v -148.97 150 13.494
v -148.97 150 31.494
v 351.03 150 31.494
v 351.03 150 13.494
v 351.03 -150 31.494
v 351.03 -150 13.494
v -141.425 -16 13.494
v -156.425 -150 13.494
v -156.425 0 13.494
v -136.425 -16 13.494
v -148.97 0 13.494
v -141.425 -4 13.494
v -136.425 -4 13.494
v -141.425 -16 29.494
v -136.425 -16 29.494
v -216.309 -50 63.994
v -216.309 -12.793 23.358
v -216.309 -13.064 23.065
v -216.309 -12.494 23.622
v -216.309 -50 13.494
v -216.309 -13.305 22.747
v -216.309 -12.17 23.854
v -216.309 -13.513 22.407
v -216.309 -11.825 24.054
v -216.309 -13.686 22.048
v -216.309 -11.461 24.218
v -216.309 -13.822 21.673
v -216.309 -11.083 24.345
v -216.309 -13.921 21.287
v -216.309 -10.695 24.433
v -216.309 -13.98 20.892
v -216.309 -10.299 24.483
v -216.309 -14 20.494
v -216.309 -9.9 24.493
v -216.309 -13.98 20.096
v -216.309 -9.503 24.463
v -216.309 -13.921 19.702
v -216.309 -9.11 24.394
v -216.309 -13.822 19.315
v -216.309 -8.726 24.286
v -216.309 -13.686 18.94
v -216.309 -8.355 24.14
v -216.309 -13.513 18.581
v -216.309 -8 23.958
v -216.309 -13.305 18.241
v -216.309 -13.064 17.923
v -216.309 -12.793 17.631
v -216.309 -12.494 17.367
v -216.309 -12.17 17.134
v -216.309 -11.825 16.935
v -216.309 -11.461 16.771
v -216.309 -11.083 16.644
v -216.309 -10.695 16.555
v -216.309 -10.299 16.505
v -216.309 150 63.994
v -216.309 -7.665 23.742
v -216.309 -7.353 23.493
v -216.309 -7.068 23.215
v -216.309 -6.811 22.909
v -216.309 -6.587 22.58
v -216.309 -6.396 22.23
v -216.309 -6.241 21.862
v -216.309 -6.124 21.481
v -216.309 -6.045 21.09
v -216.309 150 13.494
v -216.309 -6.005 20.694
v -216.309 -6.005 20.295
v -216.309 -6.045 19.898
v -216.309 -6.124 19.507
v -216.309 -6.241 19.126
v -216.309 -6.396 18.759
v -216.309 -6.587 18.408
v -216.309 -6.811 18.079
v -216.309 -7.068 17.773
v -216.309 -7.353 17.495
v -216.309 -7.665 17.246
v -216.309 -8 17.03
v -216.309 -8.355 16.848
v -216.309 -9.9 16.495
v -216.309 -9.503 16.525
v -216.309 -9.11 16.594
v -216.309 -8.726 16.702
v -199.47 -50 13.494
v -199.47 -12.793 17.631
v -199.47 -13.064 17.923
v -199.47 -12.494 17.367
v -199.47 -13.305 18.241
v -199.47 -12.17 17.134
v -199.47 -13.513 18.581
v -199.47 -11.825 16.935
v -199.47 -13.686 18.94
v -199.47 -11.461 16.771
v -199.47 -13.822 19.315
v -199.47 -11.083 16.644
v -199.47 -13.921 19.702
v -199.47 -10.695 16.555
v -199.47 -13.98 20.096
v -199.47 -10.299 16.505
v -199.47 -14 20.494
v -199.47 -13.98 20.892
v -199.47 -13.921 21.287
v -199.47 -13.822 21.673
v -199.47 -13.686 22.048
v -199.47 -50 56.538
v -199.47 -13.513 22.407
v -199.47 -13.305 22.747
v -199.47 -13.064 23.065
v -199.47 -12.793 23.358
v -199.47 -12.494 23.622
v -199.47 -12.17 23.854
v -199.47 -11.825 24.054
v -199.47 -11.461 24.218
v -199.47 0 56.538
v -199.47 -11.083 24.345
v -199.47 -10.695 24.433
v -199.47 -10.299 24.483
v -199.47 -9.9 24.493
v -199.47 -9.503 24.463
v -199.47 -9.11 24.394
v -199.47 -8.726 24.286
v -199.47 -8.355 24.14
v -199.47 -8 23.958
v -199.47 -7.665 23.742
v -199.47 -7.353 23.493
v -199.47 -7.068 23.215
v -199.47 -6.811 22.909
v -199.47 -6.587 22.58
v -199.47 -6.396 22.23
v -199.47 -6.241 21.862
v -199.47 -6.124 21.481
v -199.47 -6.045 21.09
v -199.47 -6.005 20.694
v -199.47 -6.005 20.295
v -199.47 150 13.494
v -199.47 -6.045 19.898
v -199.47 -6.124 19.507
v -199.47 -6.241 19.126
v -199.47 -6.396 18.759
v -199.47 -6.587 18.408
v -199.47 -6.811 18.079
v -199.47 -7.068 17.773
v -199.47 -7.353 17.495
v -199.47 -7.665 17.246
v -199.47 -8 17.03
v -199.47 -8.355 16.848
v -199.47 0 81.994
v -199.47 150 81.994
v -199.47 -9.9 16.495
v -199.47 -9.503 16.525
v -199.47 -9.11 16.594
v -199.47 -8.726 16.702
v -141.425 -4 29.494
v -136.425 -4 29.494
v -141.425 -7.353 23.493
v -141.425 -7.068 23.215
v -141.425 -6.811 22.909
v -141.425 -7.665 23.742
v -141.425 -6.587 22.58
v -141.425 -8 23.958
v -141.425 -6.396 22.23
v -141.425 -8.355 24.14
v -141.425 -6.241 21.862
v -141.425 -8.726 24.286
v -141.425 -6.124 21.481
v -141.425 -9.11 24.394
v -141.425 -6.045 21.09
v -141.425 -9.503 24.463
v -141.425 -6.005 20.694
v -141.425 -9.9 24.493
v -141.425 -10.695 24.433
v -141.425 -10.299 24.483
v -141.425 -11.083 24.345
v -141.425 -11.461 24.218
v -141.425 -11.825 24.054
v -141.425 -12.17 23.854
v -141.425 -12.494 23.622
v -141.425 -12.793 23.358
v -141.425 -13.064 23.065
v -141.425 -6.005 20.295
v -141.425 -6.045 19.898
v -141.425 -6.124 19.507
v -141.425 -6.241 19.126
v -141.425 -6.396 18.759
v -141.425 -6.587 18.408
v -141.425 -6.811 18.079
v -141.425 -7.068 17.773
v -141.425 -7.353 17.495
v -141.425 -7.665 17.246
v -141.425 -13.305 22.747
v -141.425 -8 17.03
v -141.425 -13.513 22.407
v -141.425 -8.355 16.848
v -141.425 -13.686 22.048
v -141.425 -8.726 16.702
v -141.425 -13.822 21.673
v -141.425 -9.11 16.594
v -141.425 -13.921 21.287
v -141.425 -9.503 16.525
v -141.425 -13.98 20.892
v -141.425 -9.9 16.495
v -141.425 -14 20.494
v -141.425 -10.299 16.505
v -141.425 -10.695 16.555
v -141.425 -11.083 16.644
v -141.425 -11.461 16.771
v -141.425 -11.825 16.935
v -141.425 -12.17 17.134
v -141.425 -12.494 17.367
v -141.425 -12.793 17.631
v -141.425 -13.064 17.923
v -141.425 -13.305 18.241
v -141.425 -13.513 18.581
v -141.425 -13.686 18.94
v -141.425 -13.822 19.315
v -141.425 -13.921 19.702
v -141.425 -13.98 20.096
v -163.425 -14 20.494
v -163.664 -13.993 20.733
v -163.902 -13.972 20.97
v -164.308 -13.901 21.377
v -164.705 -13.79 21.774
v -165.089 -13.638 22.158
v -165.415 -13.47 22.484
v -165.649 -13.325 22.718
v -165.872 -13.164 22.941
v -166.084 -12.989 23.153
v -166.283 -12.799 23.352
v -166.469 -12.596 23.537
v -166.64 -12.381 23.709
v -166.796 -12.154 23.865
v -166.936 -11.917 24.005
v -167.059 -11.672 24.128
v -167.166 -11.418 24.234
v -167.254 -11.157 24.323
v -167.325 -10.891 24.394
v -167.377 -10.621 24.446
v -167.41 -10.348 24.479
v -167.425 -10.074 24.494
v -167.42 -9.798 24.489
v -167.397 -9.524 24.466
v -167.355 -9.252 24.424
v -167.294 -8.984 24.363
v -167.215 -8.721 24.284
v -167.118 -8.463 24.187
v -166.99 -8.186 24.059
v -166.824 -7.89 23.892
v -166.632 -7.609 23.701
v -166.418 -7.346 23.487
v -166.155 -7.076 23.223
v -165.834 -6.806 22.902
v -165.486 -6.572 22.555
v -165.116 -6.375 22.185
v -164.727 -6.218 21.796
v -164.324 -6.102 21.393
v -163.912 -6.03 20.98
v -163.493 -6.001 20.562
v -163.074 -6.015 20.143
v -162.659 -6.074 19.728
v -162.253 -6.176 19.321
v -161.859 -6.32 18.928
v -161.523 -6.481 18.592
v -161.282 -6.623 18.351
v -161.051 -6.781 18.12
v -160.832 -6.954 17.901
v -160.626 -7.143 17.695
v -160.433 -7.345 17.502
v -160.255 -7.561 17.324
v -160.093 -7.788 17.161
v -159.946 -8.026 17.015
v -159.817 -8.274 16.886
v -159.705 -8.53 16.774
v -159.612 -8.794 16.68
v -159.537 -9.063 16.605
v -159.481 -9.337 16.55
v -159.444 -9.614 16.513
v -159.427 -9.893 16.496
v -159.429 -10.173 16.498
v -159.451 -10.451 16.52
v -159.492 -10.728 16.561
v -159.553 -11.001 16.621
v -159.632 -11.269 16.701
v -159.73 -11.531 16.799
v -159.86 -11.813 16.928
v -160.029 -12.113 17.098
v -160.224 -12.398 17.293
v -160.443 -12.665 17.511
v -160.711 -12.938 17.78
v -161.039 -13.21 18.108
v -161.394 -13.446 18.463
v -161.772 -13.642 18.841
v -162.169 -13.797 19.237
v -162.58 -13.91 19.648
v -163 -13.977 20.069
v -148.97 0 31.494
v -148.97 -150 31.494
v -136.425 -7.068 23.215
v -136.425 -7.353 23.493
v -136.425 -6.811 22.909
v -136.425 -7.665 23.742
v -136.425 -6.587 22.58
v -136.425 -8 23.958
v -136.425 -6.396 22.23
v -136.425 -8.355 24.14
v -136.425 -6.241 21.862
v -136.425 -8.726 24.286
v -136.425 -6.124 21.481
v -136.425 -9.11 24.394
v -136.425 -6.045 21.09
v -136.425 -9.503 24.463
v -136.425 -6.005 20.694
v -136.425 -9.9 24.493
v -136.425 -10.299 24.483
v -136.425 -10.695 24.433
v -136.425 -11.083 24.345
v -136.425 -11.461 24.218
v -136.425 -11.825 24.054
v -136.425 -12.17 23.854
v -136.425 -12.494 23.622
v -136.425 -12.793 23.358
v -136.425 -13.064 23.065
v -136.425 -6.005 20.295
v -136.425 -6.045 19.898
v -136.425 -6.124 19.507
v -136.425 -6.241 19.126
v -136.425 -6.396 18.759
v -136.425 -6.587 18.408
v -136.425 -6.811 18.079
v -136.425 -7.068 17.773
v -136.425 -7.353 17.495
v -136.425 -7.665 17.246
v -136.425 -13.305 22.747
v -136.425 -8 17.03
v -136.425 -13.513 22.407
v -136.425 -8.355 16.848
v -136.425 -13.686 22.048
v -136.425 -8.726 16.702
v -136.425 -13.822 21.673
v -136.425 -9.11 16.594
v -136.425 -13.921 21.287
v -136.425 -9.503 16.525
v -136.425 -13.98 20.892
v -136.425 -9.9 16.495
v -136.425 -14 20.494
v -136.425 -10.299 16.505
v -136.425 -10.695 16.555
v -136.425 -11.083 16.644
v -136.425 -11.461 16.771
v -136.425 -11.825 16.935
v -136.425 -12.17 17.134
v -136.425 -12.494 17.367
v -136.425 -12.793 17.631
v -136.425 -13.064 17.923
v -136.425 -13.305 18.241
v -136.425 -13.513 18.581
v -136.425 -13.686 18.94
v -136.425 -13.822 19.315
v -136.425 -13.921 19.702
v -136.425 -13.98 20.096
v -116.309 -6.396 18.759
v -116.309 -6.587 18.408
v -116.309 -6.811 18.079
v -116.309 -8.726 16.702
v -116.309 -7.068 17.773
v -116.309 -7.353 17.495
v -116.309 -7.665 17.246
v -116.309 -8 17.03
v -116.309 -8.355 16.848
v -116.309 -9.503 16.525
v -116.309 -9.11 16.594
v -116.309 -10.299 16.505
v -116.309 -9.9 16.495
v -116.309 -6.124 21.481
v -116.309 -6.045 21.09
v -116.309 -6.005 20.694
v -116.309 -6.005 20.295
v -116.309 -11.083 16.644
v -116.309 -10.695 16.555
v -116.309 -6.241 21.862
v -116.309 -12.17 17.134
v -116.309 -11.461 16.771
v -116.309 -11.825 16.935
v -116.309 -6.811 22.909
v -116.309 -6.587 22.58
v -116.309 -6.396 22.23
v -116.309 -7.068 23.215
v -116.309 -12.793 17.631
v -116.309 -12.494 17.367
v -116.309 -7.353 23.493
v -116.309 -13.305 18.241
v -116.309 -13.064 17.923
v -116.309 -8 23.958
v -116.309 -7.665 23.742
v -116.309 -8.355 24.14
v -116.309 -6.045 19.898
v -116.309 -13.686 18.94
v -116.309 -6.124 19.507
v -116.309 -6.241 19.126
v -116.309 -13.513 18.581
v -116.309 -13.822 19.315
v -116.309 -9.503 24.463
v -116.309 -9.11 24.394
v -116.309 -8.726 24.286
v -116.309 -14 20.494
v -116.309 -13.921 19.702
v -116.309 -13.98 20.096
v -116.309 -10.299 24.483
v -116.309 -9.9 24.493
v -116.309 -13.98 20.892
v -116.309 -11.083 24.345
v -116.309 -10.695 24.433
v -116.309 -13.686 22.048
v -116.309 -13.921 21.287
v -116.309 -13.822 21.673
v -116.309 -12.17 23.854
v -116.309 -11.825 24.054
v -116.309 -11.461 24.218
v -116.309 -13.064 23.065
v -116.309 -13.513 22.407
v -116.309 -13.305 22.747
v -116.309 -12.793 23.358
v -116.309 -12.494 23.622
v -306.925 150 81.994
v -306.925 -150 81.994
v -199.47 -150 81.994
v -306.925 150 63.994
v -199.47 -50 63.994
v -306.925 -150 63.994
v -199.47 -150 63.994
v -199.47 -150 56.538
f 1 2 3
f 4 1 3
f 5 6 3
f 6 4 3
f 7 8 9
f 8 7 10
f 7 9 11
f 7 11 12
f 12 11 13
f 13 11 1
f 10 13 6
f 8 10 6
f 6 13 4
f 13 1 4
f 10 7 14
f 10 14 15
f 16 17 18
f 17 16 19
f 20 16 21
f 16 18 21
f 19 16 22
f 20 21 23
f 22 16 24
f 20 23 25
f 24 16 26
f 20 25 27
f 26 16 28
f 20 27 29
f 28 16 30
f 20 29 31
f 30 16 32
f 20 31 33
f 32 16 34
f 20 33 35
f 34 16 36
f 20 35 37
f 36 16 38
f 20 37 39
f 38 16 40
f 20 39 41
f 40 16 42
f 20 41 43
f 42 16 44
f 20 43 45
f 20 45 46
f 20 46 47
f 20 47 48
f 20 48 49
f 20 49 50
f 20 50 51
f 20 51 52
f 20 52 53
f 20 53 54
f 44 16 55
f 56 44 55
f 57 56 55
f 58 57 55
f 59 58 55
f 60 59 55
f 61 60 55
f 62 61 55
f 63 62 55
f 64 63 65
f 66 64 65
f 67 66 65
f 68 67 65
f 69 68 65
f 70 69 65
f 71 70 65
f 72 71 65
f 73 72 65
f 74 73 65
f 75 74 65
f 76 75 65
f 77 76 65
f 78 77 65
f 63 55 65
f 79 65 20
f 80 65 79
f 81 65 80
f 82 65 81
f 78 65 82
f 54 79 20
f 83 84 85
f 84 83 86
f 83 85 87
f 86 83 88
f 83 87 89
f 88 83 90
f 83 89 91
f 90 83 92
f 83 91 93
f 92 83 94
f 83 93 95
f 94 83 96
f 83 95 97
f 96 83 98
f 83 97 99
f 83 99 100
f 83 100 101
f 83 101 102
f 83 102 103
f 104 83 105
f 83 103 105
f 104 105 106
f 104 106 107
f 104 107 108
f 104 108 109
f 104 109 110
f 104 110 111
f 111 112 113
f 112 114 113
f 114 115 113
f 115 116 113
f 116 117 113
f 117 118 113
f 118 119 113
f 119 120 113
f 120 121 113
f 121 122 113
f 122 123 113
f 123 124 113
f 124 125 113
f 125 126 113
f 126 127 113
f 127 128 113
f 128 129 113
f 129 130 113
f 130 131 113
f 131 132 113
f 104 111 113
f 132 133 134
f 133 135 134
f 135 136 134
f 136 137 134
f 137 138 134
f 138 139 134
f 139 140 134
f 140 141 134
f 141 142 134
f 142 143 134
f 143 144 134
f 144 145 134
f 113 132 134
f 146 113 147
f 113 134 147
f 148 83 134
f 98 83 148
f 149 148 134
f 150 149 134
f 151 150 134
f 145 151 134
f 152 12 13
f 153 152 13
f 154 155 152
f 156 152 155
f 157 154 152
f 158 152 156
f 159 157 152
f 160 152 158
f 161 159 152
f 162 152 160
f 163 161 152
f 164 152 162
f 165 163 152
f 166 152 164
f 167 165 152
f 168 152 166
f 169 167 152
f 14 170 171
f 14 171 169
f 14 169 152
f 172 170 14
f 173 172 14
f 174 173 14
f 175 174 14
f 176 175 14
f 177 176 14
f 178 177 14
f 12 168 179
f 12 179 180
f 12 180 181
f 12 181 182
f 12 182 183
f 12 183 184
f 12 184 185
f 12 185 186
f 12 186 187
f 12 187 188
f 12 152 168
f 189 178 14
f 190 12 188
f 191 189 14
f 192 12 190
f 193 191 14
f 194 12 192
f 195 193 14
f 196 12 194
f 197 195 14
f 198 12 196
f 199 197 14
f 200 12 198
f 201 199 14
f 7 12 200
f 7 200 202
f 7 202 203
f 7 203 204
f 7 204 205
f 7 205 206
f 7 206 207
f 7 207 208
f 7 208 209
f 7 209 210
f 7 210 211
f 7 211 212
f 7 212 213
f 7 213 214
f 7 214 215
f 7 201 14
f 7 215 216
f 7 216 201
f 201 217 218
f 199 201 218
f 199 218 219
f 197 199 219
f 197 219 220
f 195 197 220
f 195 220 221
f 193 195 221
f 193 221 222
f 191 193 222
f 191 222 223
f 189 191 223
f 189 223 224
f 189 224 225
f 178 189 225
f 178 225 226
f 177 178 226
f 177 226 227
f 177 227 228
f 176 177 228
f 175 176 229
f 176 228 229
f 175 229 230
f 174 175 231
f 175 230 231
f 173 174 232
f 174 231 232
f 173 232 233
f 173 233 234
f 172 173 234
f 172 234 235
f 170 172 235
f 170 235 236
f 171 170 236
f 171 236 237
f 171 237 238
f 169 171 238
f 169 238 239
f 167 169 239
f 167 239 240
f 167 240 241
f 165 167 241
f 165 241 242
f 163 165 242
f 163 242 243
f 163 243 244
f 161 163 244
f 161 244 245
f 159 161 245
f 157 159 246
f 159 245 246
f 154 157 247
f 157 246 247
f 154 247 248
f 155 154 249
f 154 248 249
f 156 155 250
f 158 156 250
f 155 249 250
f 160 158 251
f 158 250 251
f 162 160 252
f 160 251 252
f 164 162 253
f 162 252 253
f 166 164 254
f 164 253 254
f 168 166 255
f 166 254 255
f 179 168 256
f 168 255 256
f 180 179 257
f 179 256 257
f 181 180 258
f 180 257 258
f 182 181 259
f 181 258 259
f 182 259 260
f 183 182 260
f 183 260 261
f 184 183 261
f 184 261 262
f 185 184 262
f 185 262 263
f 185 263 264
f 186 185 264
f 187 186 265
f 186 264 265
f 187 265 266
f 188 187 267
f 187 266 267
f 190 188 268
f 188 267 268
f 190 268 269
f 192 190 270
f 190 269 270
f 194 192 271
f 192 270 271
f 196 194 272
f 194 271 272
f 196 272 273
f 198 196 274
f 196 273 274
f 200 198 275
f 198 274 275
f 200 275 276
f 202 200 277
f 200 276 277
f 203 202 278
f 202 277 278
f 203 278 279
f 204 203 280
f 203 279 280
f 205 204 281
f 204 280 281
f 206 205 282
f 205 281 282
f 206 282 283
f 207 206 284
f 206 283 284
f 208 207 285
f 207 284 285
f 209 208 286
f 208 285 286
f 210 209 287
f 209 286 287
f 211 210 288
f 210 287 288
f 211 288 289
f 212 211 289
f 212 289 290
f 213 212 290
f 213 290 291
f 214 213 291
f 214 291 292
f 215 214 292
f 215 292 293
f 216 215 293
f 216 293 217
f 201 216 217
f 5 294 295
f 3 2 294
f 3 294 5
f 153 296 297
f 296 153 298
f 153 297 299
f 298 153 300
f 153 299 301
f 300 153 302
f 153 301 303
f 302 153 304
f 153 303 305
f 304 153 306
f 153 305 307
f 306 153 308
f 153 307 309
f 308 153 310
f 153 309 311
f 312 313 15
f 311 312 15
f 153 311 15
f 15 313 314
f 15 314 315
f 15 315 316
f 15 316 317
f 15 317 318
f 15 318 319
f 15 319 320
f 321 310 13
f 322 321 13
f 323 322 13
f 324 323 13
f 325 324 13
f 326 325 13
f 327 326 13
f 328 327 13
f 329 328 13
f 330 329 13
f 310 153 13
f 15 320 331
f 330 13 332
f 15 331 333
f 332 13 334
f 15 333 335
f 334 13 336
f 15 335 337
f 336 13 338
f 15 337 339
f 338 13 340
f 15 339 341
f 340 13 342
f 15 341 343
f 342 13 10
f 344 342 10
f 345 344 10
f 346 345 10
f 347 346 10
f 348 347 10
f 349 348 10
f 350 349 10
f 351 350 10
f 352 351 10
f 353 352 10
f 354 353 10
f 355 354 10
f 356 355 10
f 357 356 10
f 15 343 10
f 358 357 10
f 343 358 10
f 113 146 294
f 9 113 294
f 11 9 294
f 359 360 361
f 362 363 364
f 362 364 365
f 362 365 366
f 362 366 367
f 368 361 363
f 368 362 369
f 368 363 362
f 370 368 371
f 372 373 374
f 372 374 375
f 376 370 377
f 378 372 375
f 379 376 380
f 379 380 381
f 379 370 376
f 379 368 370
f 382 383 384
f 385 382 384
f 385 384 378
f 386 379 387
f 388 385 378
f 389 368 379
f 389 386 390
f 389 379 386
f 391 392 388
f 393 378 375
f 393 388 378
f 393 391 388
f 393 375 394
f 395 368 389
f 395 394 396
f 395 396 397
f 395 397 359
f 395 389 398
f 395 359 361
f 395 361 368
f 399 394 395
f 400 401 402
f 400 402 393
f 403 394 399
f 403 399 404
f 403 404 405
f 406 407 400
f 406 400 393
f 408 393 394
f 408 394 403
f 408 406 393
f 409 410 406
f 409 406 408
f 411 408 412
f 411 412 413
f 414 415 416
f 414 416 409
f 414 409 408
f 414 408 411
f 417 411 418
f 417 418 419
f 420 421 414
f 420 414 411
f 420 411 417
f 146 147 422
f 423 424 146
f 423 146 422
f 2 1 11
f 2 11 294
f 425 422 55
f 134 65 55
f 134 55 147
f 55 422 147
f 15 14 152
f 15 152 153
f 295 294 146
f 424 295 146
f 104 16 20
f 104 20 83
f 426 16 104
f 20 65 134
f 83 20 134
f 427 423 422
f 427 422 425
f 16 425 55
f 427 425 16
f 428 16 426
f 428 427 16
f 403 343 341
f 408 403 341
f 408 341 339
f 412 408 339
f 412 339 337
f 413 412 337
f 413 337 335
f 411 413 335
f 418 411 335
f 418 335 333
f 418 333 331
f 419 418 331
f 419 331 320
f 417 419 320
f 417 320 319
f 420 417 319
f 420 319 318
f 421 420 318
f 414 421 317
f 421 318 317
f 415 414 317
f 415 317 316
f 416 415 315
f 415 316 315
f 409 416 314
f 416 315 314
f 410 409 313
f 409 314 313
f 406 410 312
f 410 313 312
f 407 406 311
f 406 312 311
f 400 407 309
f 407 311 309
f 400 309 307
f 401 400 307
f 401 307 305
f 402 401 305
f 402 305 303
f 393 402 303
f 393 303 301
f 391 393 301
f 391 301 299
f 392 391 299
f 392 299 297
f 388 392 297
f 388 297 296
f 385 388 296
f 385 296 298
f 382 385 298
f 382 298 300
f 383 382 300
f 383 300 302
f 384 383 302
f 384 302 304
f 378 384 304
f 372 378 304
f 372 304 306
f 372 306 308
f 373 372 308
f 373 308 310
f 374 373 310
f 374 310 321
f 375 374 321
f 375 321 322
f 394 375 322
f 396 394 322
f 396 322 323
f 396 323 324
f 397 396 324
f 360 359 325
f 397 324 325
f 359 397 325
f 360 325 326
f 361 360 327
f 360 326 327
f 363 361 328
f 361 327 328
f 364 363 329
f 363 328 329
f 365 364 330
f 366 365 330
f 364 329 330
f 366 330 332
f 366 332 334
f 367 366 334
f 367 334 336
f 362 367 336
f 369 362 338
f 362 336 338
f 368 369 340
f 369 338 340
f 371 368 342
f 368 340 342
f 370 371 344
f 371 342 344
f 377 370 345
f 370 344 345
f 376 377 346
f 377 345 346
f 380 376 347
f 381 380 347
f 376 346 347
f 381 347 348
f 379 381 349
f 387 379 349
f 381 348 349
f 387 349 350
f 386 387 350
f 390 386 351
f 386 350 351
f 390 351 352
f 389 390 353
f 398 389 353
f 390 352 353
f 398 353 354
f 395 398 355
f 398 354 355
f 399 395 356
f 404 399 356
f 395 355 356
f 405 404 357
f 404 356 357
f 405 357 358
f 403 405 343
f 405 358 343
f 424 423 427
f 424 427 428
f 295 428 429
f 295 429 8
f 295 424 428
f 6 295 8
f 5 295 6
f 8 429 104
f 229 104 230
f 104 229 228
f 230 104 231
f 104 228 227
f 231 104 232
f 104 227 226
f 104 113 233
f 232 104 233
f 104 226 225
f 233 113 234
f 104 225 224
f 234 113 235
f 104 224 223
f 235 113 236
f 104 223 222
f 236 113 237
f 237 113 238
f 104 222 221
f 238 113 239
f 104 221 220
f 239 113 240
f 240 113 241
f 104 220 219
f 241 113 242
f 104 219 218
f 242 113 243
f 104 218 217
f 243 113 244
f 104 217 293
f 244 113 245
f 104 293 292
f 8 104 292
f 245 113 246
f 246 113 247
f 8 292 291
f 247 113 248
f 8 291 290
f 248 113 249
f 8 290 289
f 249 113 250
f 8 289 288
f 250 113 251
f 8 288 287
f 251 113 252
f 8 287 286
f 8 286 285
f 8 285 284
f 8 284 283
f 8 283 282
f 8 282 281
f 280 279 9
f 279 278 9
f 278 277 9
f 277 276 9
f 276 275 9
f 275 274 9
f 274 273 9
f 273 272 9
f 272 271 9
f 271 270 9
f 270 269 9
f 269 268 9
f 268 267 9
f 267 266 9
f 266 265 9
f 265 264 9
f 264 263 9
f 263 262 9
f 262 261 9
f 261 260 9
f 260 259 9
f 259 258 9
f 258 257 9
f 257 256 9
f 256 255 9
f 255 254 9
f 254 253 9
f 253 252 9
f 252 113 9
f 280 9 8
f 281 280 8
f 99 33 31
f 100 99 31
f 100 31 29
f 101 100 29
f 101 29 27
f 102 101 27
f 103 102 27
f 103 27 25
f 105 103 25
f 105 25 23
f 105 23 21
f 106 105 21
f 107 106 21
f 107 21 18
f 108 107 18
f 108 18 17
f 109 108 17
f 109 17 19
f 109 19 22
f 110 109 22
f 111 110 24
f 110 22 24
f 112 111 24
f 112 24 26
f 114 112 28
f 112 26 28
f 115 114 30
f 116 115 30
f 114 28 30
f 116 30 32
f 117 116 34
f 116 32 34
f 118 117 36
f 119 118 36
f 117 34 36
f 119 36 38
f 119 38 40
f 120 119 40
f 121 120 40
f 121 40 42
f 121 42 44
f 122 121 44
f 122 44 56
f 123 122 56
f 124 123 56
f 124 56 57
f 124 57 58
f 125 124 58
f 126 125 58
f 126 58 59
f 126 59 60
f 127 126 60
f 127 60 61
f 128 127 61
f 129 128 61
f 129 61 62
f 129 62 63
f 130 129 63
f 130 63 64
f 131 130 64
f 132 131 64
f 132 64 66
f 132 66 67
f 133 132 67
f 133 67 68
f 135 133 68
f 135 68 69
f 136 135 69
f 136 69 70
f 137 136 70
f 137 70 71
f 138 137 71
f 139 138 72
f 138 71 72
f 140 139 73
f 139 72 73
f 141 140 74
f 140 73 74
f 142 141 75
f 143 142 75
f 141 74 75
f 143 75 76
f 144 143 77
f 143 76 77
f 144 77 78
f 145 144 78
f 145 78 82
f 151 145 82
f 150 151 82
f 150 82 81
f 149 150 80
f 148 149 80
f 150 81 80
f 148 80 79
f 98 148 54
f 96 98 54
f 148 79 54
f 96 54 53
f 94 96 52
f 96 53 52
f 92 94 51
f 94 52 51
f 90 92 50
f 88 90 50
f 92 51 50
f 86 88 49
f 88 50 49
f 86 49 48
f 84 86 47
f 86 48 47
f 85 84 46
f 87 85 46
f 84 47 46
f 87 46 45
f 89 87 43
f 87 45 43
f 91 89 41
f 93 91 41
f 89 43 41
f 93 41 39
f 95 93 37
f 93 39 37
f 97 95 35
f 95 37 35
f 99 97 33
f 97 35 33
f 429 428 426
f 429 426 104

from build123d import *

# Parameters (mm, degrees)
F0_W          = 500
F0_H          = 18
F1_DEPTH      = 150
F1_DEPTH_BACK = 150
F2_DEPTH      = 150
F3_DEPTH      = 150
F3_DEPTH_BACK = 150
F4_DEPTH      = 150
F4_DEPTH_BACK = 50
F5_R          = 4
F6_DEPTH      = 100
F7_W          = 5
F7_H          = 12
F8_DEPTH      = 16


with BuildPart() as f1:
    # F0 (on Front) → F1 (new body, two sides)
    with BuildSketch(Plane.XZ) as f1_sk:
        with Locations((101.0303625649, 22.4941878617)):
            Rectangle(F0_W, F0_H)
    extrude(amount=-F1_DEPTH)
    extrude(f1_sk.sketch, amount=F1_DEPTH_BACK)

    # F0 (on Front) → F2 (join)
    with BuildSketch(Plane.XZ):
        Polygon((-148.9696374351, 13.4941878617), (-148.9696374351, 31.4941878617), (-199.4696374351, 81.9941878617), (-199.4696374351, 63.9941878617), (-199.4696374351, 56.538343739), (-156.4254815578, 13.4941878617), align=None)
    extrude(amount=F2_DEPTH)

    # F0 (on Front) → F3 (join, two sides)
    with BuildSketch(Plane.XZ) as f3_sk:
        Polygon((-199.4696374351, 63.9941878617), (-199.4696374351, 81.9941878617), (-306.9254815578, 81.9941878617), (-306.9254815578, 63.9941878617), (-216.3087427616, 63.9941878617), (-206.9254815578, 63.9941878617), align=None)
    extrude(amount=F3_DEPTH)
    extrude(f3_sk.sketch, amount=-F3_DEPTH_BACK)

    # F0 (on Front) → F4 (join, two sides)
    with BuildSketch(Plane.XZ) as f4_sk:
        Polygon((-199.4696374351, 13.4941878617), (-199.4696374351, 56.538343739), (-206.9254815578, 63.9941878617), (-216.3087427616, 63.9941878617), (-216.3087427616, 13.4941878617), align=None)
        Polygon((-199.4696374351, 56.538343739), (-199.4696374351, 63.9941878617), (-206.9254815578, 63.9941878617), align=None)
    extrude(amount=-F4_DEPTH)
    extrude(f4_sk.sketch, amount=F4_DEPTH_BACK)

    # F5 (on face) → F6 (cut)
    with BuildSketch(Plane(origin=(-216.3087427616, 0, 0), x_dir=(0, -1, 0), z_dir=(-1, 0, 0))):
        with Locations((10, 20.4941878617)):
            Circle(F5_R)
    extrude(amount=-F6_DEPTH, mode=Mode.SUBTRACT)

    # F7 (on face) → F8 (cut)
    with BuildSketch(Plane(origin=(0, 0, 13.4941878617), x_dir=(1, 0, 0), z_dir=(0, 0, -1))):
        with Locations((-138.9254815578, 10)):
            Rectangle(F7_W, F7_H)
    extrude(amount=-F8_DEPTH, mode=Mode.SUBTRACT)


solid = f1.part
